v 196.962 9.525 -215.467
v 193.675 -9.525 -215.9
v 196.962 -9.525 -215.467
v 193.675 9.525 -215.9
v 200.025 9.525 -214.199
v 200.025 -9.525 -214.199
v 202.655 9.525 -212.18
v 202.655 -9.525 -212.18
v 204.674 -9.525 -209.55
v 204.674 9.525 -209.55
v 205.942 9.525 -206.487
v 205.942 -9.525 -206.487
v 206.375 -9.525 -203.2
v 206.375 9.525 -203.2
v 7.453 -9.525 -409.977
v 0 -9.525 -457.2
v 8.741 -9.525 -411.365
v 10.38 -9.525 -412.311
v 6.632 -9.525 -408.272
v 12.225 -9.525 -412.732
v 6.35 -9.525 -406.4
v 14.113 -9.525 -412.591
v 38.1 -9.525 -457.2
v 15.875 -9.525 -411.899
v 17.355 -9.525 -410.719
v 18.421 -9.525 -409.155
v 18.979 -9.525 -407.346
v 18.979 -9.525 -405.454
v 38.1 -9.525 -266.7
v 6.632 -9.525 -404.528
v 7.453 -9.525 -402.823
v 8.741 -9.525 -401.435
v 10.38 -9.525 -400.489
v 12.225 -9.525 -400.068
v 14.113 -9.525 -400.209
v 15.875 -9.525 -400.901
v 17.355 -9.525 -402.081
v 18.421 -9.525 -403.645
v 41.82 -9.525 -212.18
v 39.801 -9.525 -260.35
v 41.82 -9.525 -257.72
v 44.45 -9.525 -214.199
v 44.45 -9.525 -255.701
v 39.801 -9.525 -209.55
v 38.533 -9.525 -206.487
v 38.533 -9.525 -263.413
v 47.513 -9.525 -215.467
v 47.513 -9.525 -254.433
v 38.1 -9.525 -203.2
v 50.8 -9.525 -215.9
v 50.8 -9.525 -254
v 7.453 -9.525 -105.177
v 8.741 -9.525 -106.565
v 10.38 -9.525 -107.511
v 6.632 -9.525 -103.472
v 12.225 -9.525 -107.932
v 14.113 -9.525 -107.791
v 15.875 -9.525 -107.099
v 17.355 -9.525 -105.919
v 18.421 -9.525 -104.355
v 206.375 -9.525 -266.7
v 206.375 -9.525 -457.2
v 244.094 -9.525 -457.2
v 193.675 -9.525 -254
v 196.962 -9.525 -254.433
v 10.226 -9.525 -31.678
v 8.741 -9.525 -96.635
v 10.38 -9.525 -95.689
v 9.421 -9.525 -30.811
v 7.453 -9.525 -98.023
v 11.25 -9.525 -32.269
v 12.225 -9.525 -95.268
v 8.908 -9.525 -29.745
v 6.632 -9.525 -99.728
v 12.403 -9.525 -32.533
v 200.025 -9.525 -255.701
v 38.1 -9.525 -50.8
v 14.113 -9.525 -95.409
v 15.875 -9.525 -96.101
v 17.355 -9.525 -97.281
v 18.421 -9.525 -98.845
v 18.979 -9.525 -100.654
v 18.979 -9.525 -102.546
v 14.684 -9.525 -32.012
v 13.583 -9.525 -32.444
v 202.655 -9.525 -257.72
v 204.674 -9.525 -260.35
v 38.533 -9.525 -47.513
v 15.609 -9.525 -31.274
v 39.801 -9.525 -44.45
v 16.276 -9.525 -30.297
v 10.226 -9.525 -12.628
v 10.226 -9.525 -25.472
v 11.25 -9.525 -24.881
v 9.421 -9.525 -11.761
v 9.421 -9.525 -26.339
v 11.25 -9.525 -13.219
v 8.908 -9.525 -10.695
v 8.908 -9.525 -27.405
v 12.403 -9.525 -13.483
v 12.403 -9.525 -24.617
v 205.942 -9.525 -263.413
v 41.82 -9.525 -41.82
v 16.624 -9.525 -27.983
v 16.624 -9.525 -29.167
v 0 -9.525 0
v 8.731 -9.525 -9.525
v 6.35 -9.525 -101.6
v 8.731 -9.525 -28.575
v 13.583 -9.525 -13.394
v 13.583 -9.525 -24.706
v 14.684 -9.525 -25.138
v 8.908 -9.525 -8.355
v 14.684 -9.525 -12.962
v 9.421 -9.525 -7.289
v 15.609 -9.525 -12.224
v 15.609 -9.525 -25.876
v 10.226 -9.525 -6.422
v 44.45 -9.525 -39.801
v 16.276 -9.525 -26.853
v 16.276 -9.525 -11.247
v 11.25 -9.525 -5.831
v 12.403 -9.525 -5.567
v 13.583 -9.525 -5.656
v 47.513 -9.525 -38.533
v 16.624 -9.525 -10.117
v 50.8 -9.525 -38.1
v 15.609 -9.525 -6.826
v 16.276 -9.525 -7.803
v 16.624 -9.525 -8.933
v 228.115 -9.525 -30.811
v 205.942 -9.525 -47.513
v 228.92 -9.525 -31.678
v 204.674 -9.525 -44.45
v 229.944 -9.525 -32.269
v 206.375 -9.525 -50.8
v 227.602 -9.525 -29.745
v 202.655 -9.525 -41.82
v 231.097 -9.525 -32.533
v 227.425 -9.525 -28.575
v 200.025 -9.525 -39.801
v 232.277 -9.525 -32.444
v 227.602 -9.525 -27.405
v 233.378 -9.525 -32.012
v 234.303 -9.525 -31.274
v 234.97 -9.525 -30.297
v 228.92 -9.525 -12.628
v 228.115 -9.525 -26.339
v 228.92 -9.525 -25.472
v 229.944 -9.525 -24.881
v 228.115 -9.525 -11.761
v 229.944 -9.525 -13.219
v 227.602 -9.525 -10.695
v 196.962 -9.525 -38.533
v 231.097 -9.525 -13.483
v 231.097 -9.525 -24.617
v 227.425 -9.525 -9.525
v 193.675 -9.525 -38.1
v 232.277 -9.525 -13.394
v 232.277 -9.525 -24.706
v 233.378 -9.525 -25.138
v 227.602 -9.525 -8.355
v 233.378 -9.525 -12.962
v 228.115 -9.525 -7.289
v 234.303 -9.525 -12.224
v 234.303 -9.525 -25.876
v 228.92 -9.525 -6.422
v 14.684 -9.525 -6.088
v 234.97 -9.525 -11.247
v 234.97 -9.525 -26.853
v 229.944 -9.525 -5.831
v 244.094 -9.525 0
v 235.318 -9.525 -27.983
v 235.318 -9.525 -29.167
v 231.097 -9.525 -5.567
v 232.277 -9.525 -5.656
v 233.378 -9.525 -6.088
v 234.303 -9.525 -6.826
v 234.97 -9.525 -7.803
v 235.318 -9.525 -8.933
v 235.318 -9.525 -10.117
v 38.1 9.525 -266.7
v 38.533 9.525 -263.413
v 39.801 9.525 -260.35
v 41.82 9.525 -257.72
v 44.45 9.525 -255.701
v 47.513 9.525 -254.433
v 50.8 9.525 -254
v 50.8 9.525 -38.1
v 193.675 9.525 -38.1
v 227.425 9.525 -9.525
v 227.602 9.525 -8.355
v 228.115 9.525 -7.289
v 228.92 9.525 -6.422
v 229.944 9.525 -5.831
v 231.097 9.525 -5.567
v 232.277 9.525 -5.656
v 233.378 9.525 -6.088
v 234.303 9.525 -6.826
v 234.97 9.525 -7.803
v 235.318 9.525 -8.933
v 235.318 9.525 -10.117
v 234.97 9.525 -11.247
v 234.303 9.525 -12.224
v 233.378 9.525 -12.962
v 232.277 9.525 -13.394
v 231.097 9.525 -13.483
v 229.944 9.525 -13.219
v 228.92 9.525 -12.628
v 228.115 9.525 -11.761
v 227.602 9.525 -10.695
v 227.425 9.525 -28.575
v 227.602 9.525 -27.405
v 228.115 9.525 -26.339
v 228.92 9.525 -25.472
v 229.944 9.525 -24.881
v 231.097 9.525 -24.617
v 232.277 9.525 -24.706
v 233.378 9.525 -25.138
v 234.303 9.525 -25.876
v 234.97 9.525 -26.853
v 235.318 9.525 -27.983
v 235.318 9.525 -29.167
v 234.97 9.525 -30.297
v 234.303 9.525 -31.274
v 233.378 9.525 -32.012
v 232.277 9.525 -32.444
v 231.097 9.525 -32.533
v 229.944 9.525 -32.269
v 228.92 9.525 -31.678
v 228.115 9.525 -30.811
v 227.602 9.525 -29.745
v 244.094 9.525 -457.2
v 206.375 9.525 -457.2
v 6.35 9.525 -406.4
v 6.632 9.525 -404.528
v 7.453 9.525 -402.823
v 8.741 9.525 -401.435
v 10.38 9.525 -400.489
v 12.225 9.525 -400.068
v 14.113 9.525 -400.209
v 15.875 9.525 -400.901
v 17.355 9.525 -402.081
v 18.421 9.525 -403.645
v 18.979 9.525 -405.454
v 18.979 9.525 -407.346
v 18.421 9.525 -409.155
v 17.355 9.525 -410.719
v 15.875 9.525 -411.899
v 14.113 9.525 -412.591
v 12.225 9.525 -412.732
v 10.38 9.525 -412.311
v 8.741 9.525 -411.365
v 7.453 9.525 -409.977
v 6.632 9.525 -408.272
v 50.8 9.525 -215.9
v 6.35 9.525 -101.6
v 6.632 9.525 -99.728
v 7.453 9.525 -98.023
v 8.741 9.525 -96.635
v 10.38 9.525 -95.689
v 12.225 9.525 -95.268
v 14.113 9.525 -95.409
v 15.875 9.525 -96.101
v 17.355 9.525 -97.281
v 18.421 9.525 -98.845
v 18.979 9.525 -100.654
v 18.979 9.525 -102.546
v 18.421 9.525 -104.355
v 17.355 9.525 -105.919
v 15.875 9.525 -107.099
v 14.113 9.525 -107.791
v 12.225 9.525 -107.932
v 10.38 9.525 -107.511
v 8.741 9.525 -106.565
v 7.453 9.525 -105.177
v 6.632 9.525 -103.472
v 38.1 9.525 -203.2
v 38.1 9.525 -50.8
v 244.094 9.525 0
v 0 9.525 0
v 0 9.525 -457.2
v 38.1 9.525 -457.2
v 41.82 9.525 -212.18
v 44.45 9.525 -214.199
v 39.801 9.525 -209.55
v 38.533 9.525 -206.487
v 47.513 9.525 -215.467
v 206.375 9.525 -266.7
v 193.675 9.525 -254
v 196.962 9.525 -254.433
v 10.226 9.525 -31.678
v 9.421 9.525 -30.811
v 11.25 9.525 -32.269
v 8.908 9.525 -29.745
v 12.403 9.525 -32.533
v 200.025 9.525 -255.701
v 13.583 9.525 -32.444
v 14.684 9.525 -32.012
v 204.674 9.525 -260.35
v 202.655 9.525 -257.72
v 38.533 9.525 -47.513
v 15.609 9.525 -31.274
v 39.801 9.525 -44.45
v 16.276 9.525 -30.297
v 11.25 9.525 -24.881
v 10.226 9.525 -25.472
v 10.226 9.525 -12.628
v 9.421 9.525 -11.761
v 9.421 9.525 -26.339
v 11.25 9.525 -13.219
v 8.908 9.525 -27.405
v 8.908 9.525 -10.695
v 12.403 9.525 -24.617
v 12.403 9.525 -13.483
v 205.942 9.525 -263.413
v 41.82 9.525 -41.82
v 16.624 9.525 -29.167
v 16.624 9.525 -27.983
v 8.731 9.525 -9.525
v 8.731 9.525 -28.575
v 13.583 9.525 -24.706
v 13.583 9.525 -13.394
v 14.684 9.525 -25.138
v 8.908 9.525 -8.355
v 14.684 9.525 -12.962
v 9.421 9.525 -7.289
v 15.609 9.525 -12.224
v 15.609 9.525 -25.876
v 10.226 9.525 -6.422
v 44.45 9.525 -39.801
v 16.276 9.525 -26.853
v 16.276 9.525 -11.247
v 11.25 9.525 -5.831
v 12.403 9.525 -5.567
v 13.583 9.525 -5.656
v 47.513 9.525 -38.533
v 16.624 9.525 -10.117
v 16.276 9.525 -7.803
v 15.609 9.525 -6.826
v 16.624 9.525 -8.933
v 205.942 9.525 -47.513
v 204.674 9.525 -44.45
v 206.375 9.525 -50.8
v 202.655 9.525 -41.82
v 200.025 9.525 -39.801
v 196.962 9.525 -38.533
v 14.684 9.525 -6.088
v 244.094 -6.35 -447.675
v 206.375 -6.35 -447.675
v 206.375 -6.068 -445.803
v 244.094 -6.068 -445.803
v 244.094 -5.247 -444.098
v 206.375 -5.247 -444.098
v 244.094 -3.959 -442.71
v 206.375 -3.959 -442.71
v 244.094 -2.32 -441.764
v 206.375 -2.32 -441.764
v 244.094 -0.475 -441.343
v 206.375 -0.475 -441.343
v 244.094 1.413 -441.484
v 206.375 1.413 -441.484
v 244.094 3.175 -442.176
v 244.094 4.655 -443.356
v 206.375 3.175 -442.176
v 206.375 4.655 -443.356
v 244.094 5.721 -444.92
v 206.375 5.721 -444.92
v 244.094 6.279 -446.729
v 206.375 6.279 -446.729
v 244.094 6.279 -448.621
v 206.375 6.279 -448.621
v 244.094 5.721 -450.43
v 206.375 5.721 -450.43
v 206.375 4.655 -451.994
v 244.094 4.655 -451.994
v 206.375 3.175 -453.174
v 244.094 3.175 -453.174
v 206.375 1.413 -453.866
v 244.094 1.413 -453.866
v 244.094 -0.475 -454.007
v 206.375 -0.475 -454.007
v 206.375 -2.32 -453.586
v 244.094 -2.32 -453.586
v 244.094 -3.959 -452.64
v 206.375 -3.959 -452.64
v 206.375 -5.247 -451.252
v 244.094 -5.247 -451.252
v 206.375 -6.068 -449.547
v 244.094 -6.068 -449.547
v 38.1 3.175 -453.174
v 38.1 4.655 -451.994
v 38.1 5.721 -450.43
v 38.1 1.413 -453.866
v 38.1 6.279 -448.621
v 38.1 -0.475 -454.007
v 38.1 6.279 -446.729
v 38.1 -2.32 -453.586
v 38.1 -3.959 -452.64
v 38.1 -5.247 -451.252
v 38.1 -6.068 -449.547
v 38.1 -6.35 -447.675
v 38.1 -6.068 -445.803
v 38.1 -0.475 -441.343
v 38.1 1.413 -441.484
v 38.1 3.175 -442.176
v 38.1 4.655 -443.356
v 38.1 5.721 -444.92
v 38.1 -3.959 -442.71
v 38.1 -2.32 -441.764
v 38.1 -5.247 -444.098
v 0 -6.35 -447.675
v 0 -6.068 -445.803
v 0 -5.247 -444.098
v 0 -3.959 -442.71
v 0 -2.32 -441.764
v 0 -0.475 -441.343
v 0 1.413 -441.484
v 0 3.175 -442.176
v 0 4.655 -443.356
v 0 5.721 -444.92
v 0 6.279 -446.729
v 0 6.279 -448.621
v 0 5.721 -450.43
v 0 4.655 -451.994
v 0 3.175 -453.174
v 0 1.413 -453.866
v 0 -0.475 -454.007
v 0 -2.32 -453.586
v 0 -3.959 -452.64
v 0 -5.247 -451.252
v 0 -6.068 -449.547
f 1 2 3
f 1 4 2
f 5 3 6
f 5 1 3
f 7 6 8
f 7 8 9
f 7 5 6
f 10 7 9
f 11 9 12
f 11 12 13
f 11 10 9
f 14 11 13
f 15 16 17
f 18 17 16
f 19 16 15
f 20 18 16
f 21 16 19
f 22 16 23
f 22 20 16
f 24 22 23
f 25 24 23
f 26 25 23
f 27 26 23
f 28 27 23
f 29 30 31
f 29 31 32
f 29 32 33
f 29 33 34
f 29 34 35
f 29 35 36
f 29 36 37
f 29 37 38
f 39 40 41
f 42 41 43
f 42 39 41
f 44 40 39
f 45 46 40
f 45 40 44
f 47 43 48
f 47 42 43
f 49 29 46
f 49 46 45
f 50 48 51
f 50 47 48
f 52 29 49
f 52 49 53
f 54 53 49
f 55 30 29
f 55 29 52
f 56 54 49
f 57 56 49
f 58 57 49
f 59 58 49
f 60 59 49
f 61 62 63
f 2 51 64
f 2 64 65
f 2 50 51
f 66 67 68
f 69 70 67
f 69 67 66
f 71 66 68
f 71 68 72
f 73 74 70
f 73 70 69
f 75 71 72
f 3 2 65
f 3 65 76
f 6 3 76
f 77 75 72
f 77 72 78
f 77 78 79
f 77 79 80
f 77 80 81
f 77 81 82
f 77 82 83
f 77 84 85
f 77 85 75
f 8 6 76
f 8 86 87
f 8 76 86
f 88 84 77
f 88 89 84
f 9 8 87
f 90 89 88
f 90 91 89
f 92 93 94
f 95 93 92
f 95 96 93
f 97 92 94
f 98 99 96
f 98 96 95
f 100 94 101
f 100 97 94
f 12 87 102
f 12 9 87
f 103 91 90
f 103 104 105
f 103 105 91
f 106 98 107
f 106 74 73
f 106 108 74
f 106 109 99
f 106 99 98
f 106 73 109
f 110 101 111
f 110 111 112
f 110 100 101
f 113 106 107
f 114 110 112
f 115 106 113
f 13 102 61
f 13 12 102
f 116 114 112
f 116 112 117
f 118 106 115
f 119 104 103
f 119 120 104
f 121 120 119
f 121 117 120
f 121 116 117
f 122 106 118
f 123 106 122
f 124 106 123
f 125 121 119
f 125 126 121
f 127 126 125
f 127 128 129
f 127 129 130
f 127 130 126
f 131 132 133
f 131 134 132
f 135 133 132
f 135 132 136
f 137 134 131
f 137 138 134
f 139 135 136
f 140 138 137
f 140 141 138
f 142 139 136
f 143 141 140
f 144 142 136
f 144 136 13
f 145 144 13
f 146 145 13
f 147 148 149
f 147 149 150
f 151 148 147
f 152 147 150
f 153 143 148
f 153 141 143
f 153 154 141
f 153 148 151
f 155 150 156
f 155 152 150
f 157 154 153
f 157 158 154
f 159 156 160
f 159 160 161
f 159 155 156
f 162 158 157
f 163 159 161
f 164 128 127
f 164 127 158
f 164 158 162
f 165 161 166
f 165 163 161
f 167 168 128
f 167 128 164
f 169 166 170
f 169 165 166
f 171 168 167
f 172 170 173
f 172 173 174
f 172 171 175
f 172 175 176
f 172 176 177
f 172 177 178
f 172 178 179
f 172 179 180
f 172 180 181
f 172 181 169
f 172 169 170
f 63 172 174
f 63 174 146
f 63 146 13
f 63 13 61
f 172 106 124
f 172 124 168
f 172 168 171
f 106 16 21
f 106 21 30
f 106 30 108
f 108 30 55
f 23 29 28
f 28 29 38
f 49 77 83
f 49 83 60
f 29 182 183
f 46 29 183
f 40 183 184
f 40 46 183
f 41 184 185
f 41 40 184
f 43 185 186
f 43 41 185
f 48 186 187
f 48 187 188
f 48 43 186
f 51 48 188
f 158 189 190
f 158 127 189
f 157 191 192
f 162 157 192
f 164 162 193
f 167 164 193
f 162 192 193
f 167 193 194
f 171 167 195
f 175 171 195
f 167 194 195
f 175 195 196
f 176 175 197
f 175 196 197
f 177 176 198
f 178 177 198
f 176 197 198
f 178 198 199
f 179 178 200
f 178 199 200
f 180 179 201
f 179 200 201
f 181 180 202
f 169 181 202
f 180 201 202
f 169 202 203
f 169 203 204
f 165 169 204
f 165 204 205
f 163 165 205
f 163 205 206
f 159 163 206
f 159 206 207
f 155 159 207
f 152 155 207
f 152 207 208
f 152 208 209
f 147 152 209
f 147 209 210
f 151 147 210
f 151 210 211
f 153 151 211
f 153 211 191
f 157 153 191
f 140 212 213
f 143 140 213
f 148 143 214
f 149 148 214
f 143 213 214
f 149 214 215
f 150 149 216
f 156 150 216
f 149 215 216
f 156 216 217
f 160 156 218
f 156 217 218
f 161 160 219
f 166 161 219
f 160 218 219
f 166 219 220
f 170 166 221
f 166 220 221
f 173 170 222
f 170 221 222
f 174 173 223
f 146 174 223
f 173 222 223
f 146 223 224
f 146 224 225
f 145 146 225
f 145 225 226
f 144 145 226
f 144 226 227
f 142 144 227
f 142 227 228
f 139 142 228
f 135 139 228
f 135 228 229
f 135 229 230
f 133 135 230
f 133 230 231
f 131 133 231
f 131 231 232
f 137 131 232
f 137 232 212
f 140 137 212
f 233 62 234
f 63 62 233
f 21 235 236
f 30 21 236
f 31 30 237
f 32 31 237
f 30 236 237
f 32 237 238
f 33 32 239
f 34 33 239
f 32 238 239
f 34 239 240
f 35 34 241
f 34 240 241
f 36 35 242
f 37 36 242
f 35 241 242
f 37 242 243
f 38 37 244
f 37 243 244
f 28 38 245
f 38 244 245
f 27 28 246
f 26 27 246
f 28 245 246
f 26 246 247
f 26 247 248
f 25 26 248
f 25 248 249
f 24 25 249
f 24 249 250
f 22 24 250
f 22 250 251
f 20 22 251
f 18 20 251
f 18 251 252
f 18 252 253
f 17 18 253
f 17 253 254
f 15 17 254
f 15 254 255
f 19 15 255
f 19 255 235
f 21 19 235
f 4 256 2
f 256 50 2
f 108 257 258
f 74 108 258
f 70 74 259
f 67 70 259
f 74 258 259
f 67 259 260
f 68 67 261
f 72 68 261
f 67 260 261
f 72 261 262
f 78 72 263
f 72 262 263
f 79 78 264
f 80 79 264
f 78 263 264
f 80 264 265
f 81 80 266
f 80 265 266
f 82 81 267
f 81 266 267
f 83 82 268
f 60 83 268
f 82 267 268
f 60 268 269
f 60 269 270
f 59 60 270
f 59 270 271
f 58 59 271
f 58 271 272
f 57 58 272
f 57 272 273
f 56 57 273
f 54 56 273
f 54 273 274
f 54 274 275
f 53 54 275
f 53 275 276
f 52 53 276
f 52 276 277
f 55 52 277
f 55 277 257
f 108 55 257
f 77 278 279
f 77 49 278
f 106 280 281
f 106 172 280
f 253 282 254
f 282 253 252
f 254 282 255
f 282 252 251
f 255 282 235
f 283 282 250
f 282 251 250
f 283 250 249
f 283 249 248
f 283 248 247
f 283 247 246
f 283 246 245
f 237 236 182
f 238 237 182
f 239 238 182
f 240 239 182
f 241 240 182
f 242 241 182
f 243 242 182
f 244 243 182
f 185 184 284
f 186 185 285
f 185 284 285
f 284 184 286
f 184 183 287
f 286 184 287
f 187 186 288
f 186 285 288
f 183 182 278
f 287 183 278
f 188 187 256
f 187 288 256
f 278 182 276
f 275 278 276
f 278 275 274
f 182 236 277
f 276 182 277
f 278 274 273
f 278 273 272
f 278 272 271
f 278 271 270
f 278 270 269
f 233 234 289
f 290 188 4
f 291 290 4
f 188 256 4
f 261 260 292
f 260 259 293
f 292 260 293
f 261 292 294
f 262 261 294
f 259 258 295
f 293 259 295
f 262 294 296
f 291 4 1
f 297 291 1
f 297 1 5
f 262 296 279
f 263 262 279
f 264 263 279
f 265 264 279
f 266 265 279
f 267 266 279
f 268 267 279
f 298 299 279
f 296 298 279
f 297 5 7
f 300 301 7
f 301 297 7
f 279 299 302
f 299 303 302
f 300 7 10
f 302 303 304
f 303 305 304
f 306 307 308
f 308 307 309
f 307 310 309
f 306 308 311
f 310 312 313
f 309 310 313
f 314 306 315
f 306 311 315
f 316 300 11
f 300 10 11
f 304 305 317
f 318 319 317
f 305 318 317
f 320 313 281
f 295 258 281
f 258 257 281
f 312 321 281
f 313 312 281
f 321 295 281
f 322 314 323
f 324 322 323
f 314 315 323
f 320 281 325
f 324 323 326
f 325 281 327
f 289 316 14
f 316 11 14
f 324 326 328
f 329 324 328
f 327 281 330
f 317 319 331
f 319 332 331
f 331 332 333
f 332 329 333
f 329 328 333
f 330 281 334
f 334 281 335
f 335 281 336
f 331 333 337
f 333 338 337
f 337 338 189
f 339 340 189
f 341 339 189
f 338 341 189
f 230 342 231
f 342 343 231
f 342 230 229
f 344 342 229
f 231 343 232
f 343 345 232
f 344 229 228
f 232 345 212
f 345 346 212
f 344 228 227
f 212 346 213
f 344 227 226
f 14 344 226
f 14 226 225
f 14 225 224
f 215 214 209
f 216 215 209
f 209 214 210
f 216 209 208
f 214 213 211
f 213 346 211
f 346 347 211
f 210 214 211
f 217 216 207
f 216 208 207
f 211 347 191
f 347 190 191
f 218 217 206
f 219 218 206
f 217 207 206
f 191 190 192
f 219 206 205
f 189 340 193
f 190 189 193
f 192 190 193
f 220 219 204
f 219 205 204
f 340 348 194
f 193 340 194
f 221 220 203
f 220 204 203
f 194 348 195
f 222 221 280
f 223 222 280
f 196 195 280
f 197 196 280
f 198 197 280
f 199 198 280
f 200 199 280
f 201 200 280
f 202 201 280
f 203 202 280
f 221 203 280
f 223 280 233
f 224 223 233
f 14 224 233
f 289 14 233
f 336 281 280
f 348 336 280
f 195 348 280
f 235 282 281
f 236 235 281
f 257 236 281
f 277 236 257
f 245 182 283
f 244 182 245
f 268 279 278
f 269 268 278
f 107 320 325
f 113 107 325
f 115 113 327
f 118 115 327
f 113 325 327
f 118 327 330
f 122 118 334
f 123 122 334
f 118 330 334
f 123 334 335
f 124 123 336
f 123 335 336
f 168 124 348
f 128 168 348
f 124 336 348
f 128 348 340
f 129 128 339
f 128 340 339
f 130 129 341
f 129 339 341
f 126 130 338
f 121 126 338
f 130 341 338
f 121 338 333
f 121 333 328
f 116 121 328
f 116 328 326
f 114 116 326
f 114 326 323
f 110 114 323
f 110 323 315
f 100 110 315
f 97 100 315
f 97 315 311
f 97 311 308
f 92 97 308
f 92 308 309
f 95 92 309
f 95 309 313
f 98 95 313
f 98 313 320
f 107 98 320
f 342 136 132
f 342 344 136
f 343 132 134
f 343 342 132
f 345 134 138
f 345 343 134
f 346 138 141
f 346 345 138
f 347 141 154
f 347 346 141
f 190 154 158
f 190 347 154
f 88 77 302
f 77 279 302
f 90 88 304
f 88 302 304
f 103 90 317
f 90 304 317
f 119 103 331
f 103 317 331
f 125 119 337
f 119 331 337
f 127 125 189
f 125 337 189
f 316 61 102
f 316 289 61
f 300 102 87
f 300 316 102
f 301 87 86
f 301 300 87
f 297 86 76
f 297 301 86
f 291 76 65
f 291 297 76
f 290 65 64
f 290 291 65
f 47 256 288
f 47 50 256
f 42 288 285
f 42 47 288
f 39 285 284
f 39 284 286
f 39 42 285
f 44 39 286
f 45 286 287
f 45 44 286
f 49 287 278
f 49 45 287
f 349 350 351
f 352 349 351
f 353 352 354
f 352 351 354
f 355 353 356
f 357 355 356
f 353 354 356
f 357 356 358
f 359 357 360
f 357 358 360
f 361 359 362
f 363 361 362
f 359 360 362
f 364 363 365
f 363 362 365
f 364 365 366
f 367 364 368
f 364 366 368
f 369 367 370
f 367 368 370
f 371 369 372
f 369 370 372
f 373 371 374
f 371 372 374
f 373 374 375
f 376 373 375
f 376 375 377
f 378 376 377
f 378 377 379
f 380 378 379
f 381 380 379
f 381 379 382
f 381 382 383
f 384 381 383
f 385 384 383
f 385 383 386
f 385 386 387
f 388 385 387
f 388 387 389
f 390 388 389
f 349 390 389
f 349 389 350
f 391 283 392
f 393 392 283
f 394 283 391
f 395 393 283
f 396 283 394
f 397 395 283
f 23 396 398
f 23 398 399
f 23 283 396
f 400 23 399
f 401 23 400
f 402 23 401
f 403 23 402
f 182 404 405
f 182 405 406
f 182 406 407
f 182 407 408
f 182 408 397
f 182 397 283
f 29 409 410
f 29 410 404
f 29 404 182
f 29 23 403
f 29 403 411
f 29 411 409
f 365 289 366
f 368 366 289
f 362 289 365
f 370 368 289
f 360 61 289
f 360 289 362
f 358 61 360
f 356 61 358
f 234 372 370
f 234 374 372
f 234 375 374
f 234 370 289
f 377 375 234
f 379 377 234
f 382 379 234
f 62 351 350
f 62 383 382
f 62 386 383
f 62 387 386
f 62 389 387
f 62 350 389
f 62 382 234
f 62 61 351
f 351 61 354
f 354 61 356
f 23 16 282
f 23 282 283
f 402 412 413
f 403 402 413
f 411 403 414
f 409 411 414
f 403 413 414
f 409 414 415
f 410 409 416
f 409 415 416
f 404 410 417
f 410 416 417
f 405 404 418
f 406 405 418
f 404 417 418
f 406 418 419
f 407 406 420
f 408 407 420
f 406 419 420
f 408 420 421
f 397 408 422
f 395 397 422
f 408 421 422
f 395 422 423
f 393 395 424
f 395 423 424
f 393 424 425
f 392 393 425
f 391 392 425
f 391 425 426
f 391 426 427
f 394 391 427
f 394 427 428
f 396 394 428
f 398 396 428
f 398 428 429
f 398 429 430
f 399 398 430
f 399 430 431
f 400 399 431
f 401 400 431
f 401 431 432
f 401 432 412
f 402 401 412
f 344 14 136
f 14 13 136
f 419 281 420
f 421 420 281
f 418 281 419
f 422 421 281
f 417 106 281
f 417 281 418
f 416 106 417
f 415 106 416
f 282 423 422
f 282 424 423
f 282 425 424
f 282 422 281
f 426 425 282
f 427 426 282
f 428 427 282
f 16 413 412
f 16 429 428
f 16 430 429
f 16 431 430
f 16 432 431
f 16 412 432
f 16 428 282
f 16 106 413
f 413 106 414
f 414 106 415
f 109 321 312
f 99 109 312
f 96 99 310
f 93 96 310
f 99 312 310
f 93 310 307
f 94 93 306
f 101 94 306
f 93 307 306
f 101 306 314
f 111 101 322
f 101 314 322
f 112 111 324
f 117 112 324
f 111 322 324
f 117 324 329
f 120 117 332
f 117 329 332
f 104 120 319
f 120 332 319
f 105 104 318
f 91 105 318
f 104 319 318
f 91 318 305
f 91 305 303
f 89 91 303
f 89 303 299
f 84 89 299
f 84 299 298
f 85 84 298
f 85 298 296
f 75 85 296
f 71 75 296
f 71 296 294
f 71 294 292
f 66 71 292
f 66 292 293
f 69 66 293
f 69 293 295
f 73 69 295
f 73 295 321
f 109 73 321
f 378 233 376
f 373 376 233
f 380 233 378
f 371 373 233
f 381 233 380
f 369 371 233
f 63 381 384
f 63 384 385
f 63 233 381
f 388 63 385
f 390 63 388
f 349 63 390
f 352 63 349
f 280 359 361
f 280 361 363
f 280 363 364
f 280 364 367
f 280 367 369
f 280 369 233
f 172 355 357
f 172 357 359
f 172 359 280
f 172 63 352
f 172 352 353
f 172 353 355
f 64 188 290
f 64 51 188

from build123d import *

# Parameters (mm, degrees)
F0_W     = 168.275
F0_H     = 177.8
F1_DEPTH = 9.525
F3_D     = 12.7
F5_D     = 12.7
F7_D     = 7.9375
F8_R     = 12.7


# Not quite as in the source:
# - a length typed as a fraction of an inch, garbled in the dataset ("3 / 203.2 mm" for 3/8 in), is restored


with BuildPart() as f1:
    # F0 (on Front) → F1 (new body, symmetric)
    with BuildSketch(Plane.XZ):
        Polygon((244.094, 0), (0, 0), (0, -457.2), (38.1, -457.2), (38.1, -254), (206.375, -254), (206.375, -457.2), (244.094, -457.2), align=None)
        with Locations((122.2375, -127)):
            Rectangle(F0_W, F0_H, mode=Mode.SUBTRACT)
    extrude(amount=F1_DEPTH, both=True)

    # F3 (through all)
    with Locations(Plane.YZ.offset(244.094)):
        with Locations((0, -447.675)):
            Hole(F3_D / 2)

    # F5 (through all)
    with Locations(Plane.XZ.offset(9.525)):
        with Locations((12.7, -406.4), (12.7, -101.6)):
            Hole(F5_D / 2)

    # F7 (through all)
    with Locations(Plane.XZ.offset(9.525)):
        with Locations((12.7, -9.525), (12.7, -28.575), (231.394, -28.575), (231.394, -9.525)):
            Hole(F7_D / 2)

    # F8
    f8_edges = [f1.edges().sort_by_distance(p)[0] for p in [
        (38.1, 0, -38.1),
        (206.375, 0, -38.1),
        (206.375, 0, -215.9),
        (38.1, 0, -215.9),
        (206.375, 0, -254),
        (38.1, 0, -254),
    ]]
    fillet(f8_edges, radius=F8_R)


solid = f1.part
